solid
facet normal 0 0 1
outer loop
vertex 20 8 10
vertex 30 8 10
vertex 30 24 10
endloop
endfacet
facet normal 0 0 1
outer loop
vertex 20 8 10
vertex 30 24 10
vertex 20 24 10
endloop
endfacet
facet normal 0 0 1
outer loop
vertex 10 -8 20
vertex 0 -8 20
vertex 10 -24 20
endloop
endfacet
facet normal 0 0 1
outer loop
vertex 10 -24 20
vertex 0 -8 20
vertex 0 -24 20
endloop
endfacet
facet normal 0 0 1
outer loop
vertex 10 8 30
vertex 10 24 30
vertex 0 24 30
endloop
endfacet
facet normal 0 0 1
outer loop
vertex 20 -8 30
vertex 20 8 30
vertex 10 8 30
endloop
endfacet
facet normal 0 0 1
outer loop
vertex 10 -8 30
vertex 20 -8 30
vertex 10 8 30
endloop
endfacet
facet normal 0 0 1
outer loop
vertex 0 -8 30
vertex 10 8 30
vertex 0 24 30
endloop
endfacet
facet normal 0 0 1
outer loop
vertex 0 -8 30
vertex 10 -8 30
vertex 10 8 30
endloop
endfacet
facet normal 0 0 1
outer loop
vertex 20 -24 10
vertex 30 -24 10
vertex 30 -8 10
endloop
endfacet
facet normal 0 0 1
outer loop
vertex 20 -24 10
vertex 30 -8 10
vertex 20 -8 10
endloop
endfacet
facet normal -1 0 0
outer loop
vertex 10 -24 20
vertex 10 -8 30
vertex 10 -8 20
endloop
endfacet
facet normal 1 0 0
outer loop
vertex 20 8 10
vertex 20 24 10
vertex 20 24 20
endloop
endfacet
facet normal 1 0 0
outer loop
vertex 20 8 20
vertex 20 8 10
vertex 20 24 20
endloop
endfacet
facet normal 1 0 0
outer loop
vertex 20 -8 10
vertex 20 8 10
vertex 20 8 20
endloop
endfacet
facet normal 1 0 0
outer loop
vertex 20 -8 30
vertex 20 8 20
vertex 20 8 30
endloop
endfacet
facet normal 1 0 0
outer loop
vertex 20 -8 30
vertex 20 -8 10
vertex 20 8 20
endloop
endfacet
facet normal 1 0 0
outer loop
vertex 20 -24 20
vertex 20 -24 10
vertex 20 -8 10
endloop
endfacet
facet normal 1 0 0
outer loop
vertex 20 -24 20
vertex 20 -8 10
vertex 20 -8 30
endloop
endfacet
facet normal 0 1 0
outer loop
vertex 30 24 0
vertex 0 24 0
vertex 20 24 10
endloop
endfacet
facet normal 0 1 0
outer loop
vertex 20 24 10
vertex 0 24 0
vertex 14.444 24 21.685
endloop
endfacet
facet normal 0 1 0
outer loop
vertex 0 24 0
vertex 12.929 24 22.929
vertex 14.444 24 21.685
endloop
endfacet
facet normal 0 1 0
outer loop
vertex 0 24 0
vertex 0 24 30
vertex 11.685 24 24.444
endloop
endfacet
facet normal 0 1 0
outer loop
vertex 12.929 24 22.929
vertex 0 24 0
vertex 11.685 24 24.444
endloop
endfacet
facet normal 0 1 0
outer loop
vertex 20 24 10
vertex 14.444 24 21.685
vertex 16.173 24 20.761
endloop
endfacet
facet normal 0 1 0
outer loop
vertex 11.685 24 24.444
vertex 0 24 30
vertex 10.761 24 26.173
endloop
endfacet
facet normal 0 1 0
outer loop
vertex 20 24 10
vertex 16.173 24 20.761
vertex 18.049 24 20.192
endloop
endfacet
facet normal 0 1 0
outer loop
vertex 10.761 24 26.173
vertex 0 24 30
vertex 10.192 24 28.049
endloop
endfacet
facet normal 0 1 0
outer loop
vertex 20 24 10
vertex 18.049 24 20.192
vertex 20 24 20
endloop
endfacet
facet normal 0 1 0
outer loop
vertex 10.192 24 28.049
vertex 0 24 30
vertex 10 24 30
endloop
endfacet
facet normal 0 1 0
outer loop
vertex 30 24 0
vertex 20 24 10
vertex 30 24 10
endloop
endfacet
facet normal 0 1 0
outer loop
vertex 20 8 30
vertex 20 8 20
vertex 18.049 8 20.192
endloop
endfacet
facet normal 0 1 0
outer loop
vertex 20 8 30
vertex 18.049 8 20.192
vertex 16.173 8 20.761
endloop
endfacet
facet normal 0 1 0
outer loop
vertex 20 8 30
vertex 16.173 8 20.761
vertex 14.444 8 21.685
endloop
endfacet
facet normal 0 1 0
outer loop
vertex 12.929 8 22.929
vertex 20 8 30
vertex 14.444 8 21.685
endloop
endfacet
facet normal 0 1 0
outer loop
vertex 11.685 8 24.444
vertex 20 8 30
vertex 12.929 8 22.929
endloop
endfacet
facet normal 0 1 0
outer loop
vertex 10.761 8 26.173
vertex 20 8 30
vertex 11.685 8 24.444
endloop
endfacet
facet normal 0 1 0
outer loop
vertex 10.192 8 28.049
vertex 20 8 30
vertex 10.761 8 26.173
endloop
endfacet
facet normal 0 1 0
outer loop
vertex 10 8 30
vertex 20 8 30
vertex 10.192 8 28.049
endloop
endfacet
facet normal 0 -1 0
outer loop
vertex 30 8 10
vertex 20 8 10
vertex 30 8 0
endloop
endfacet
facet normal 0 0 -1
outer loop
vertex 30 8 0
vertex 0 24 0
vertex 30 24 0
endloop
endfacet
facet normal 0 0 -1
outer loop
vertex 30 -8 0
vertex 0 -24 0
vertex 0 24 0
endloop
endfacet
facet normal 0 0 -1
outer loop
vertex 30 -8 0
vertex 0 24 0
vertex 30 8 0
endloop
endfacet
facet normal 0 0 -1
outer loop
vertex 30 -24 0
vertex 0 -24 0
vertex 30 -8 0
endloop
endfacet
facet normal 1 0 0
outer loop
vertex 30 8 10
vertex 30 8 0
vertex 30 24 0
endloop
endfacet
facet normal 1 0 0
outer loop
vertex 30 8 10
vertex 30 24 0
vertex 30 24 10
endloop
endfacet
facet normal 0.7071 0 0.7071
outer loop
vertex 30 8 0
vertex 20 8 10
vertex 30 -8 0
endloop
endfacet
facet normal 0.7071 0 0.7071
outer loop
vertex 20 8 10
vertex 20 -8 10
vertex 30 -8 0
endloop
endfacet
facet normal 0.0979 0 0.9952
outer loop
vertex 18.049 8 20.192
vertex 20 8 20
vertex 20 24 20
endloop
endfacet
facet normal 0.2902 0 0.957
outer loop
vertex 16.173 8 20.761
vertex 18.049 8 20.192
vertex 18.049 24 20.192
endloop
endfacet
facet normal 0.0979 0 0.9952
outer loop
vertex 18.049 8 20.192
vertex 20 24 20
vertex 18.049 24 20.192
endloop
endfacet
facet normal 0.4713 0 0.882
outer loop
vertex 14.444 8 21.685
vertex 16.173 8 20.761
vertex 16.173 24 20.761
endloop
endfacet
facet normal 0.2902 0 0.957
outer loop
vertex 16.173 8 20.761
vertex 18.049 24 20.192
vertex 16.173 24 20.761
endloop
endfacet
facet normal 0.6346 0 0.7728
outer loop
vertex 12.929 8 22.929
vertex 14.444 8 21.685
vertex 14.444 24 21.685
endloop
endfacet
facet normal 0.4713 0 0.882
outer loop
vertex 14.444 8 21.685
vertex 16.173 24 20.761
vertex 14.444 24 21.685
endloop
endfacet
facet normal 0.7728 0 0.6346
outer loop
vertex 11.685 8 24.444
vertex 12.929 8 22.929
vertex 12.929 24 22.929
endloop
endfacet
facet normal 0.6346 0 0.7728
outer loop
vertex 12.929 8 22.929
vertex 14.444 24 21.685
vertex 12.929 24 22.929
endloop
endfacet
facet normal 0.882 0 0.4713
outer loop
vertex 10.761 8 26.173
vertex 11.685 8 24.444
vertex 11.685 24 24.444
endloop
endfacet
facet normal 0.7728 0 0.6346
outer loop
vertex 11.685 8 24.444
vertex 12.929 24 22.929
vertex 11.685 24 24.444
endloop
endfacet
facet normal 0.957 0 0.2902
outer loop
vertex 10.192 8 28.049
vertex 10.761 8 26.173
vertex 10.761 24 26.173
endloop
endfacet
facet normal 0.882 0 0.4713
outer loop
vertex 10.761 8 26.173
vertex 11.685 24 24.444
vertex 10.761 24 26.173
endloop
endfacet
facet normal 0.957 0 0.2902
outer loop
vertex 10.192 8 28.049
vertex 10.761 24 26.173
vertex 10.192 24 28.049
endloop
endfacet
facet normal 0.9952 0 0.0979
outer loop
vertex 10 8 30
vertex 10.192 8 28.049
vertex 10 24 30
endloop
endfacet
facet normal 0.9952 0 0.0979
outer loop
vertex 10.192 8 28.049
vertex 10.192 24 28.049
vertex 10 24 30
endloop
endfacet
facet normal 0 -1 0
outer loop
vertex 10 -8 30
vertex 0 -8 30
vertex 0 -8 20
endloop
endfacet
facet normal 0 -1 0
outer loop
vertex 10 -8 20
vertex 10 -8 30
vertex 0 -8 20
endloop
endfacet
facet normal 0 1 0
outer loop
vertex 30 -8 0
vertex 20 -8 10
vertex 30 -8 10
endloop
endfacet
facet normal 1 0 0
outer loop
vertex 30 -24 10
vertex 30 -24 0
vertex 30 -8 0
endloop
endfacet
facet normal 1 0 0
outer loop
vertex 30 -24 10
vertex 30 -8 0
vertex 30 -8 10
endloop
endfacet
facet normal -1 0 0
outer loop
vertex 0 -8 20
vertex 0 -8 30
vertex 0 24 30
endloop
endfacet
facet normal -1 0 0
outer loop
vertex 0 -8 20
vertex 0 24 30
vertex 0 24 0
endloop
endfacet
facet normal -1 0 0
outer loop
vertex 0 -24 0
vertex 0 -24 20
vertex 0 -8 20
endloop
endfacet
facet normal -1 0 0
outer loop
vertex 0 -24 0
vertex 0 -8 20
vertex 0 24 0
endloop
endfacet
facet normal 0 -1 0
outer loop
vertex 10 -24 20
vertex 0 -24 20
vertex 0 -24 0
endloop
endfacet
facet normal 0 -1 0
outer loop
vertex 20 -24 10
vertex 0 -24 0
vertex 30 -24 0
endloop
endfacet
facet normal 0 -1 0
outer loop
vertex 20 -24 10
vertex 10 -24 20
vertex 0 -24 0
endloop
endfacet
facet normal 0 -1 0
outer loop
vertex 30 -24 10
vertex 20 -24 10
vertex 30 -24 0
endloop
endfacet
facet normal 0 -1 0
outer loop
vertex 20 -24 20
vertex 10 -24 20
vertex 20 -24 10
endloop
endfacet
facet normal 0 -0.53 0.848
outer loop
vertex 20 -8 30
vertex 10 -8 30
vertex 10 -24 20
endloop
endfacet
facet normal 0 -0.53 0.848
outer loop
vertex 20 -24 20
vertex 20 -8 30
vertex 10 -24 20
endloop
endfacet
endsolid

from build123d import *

# Parameters (mm, degrees)
F1_DEPTH = 24
F3_DEPTH = 8
F5_DEPTH = 30.001
F6_DEPTH = 10
F7_R     = 10
F8_DEPTH = 16


with BuildPart() as f1:
    # F0 (on Front) → F1 (new body, symmetric)
    with BuildSketch(Plane.XZ):
        Polygon((0, 30), (0, 0), (30, 0), (30, 10), (20, 10), (20, 30), align=None)
    extrude(amount=F1_DEPTH, both=True)

    # F2 (on Front) → F3 (cut, symmetric)
    with BuildSketch(Plane.XZ):
        Polygon((30, 0), (30, 10), (20, 10), align=None)
    extrude(amount=F3_DEPTH, both=True, mode=Mode.SUBTRACT)

    # F4 (on face) → F5 (cut, through all)
    with BuildSketch(Plane(origin=(0, 0, 0), x_dir=(0, -1, 0), z_dir=(-1, 0, 0))):
        Polygon((24, 20), (24, 30), (8, 30), align=None)
    extrude(amount=-F5_DEPTH, mode=Mode.SUBTRACT)

    # F4 (on face) → F6 (cut)
    with BuildSketch(Plane(origin=(0, 0, 0), x_dir=(0, -1, 0), z_dir=(-1, 0, 0))):
        Polygon((24, 20), (8, 30), (8, 20), align=None)
    extrude(amount=-F6_DEPTH, mode=Mode.SUBTRACT)

    # F7 (on face) → F8 (cut)
    with BuildSketch(Plane(origin=(0, 24, 0), x_dir=(-1, 0, 0), z_dir=(0, 1, 0))):
        with Locations((-20, 30)):
            Circle(F7_R)
    extrude(amount=-F8_DEPTH, mode=Mode.SUBTRACT)


solid = f1.part
